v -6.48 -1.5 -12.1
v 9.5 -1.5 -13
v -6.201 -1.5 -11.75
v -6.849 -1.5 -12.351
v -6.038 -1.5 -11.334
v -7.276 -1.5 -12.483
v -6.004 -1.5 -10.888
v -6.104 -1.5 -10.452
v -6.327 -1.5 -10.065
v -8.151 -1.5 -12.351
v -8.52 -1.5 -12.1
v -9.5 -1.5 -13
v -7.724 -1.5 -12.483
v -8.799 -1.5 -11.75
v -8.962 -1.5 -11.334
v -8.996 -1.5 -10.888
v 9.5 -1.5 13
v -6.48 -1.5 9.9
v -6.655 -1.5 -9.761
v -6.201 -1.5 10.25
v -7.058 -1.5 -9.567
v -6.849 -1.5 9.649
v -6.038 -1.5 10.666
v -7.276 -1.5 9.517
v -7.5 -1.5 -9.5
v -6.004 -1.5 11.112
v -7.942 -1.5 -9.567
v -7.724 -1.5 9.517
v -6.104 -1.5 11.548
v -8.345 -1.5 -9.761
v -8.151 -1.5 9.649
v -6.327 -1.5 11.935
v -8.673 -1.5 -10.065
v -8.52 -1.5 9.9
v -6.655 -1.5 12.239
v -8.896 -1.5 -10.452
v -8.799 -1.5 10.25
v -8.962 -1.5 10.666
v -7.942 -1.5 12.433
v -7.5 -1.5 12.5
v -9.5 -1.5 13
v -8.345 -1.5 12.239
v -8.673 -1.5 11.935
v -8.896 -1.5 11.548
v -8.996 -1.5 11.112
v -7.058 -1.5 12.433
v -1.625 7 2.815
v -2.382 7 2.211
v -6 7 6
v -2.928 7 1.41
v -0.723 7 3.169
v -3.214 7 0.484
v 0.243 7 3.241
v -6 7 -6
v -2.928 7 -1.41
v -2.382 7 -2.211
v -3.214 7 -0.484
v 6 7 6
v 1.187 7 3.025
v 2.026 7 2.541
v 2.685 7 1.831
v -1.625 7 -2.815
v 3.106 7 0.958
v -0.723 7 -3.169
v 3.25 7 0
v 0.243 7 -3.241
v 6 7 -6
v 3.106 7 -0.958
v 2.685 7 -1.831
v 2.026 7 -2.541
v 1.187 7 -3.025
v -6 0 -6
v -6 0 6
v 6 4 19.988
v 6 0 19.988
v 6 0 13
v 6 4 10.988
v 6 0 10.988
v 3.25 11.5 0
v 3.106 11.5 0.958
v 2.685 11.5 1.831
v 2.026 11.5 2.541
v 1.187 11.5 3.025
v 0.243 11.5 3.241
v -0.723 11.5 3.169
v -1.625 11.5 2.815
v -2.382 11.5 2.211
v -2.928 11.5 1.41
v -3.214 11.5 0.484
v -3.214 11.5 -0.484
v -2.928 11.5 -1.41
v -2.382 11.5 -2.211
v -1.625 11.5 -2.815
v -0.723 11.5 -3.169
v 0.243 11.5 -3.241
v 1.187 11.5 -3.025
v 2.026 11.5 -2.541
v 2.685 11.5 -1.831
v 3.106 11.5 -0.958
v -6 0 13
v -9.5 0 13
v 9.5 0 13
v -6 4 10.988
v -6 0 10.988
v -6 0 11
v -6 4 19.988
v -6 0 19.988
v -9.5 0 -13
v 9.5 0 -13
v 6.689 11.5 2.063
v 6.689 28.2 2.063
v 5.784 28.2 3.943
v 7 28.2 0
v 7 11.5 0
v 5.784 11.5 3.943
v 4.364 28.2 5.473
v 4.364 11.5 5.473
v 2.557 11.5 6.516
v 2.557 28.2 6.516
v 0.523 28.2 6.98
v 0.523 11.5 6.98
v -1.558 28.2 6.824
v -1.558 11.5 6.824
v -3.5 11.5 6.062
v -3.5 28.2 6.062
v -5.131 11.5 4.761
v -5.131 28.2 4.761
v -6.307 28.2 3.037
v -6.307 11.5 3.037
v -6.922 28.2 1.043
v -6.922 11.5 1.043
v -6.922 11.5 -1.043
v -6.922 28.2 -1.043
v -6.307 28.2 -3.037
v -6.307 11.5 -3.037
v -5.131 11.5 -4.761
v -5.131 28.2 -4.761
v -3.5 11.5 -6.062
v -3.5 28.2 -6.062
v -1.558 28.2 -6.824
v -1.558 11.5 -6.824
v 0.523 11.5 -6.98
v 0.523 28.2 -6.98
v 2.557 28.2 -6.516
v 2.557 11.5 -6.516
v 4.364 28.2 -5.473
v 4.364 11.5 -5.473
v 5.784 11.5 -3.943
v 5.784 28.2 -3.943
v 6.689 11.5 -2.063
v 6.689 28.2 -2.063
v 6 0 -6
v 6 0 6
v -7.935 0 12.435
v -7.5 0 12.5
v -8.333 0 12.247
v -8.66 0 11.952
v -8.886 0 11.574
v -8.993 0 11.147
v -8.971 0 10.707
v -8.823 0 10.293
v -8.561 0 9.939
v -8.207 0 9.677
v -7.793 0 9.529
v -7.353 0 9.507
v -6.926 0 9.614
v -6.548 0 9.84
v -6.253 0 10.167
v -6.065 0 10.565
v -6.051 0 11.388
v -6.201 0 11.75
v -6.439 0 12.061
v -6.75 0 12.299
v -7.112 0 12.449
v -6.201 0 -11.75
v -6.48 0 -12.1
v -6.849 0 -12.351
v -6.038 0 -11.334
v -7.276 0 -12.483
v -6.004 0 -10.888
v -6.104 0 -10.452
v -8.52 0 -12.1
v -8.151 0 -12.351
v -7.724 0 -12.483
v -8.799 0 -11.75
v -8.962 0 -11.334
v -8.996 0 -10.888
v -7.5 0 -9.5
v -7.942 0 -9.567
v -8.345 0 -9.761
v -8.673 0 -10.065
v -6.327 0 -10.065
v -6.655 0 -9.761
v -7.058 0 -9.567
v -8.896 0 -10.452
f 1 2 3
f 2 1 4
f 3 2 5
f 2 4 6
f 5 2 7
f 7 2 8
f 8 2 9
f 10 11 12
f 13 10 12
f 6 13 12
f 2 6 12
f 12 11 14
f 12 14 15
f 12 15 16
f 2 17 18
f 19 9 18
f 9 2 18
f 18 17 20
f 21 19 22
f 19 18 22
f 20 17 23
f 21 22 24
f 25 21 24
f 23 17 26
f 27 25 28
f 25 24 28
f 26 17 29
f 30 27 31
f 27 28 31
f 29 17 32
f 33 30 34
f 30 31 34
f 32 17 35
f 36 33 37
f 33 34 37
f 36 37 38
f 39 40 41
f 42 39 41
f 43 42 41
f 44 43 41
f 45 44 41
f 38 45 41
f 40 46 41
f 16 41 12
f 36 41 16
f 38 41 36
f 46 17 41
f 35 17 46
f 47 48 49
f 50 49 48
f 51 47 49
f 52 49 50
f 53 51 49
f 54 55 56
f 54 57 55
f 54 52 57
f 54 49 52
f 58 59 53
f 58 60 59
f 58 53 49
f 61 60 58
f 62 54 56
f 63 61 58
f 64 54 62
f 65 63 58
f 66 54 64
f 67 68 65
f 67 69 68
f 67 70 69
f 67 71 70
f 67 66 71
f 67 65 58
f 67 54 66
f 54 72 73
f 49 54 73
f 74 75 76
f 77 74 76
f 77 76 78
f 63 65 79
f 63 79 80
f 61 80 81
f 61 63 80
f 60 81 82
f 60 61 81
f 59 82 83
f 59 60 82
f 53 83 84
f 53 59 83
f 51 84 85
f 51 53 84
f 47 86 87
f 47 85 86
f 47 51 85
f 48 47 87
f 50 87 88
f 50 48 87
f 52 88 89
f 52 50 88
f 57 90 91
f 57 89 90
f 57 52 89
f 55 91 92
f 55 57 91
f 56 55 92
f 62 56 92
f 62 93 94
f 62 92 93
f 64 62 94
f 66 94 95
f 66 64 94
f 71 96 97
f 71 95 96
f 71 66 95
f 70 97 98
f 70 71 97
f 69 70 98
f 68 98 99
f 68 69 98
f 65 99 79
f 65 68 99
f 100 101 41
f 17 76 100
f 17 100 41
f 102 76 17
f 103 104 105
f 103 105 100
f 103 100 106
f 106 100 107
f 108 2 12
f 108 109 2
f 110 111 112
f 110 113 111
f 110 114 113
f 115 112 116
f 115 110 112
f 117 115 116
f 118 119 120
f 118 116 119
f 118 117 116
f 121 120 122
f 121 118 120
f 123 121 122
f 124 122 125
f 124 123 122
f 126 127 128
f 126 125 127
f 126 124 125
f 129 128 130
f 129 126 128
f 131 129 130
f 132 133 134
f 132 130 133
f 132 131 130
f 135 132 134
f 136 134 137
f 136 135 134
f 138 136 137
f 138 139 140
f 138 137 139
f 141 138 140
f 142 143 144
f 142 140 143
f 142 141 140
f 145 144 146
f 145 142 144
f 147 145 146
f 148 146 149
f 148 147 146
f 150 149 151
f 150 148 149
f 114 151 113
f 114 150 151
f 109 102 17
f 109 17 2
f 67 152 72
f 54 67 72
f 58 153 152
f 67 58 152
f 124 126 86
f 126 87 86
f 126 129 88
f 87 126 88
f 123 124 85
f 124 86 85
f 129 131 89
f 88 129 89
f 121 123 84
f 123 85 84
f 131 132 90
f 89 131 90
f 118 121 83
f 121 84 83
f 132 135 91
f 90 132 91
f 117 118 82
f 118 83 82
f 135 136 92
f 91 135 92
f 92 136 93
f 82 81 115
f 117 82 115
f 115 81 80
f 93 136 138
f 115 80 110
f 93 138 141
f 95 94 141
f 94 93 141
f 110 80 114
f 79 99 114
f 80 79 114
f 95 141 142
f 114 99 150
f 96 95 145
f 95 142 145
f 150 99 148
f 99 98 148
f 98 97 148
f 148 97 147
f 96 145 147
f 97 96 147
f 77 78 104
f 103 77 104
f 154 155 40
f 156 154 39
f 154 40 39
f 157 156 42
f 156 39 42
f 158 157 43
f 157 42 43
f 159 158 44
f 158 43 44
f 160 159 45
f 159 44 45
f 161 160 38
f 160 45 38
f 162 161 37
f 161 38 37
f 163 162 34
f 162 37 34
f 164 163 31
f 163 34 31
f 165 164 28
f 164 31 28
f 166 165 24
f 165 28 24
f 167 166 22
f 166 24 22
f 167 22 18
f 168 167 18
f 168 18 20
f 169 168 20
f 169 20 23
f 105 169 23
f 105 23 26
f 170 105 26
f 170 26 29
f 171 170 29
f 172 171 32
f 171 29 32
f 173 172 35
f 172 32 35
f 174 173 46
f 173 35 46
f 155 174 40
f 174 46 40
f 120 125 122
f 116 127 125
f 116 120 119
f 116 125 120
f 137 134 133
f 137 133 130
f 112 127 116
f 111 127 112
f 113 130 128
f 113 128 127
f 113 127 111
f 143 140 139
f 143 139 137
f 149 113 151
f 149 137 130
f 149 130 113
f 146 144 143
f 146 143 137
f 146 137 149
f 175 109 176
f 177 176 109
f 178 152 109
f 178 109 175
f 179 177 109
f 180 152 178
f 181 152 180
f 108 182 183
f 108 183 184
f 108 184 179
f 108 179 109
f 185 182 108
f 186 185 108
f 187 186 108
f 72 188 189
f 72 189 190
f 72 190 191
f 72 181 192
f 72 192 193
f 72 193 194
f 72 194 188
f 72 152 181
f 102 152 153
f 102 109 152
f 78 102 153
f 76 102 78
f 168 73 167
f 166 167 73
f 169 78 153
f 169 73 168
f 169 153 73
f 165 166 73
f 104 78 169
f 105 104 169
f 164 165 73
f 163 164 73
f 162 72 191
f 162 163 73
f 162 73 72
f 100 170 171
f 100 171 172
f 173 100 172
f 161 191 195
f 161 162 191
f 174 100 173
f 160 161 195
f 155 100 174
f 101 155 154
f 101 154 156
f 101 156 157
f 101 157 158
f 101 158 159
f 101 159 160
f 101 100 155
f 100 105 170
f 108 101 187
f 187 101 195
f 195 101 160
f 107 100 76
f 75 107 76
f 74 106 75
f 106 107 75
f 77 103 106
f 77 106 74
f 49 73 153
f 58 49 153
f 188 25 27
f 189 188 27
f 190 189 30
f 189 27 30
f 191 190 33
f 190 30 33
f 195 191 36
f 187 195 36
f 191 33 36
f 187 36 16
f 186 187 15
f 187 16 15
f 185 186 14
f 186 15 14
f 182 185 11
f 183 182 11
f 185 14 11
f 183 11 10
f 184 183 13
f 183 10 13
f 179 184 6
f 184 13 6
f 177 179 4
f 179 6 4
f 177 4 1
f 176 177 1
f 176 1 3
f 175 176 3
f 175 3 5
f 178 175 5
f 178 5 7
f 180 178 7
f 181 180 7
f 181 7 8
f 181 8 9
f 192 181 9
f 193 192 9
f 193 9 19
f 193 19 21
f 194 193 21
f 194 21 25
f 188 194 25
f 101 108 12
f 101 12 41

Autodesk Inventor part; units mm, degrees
ref_plane "YZ Plane" through (0, 0, 0) normal (1, 0, 0) x (0, 1, 0)
ref_plane "XZ Plane" through (0, 0, 0) normal (0, 1, 0) x (-1, 0, 0)
ref_plane "XY Plane" through (0, 0, 0) normal (0, 0, 1) x (1, 0, 0)
sketch "Sketch1" plane through (0, 0, 0) normal (0, 1, 0) x (-1, 0, 0)
  line L0 (9.5, 13) -> (-9.5, 13)
  line L1 (-9.5, 13) -> (-9.5, -13)
  line L2 (-9.5, -13) -> (9.5, -13)
  line L3 (9.5, -13) -> (9.5, 13)
  line L4 (9.5, 13) -> (-9.5, -13) construction
  line L5 (-9.5, 13) -> (9.5, -13) construction
  line L6 (7.5, 11) -> (-7.5, 11) construction
  line L7 (-7.5, 11) -> (-7.5, -11) construction
  line L8 (-7.5, -11) -> (7.5, -11) construction
  line L9 (7.5, -11) -> (7.5, 11) construction
  point P0 (0, 0)
  dimension "d0" = 19
  dimension "d1" = 26
  dimension "d2" = 2
extrude "Extrusion1" add sketch "Sketch1" against normal blind 1.5
sketch "Sketch2" plane through (0, 0, 0) normal (0, 1, 0) x (1, 0, 0)
  line L0 (-6, -19.9878) -> (6, -19.9878)
  line L1 (6, -19.9878) -> (6, -10.9878)
  line L2 (6, -10.9878) -> (-6, -10.9878)
  line L3 (-6, -10.9878) -> (-6, -19.9878)
  line L4 (-6, -19.9878) -> (6, -10.9878) construction
  line L5 (6, -19.9878) -> (-6, -10.9878) construction
  line L6 (-9.5, 13) -> (-9.5, -13) projected
  line L7 (-9.5, -13) -> (9.5, -13) projected
  point P0 (0, 0)
  point P1 (0, -15.4878)
  point P2 (0, -10.9878)
  point P3 (0, -10.9878)
  point P4 (0, -10.9878)
  dimension "d12" = 12
  dimension "d13" = 9
  dimension "d14" = 9.5
  dimension "d15" = 2.0122
extrude "Extrusion2" add sketch "Sketch2" along normal blind 4
sketch "Sketch3" plane through (0, 0, 0) normal (0, 1, 0) x (1, 0, 0)
  line L0 (-6, -6) -> (6, -6)
  line L1 (6, -6) -> (6, 6)
  line L2 (6, 6) -> (-6, 6)
  line L3 (-6, 6) -> (-6, -6)
  line L4 (-6, -6) -> (6, 6) construction
  line L5 (6, -6) -> (-6, 6) construction
  point P0 (0, 0)
  dimension "d18" = 12
  dimension "d19" = 12
hole "Hole2" at (-7.5, 0, 11) at (-7.5, 0, -11) direction (0, -1, 0) diameter 3 end through all
extrude "Extrusion3" add sketch "Sketch3" along normal blind 7
sketch "Sketch4" plane through (0, 7, 0) normal (0, 1, 0) x (1, 0, 0)
  circle A0 centre (0, 0) radius 3.25
  dimension "d29" = 6.5
extrude "Extrusion4" add sketch "Sketch4" along normal blind 4.5
sketch "Sketch5" plane through (0, 11.5, 0) normal (0, 1, 0) x (1, 0, 0)
  circle A0 centre (0, 0) radius 7
  dimension "d32" = 14
extrude "Extrusion5" add sketch "Sketch5" along normal blind 16.7
properties part number "encoder_footprint"
